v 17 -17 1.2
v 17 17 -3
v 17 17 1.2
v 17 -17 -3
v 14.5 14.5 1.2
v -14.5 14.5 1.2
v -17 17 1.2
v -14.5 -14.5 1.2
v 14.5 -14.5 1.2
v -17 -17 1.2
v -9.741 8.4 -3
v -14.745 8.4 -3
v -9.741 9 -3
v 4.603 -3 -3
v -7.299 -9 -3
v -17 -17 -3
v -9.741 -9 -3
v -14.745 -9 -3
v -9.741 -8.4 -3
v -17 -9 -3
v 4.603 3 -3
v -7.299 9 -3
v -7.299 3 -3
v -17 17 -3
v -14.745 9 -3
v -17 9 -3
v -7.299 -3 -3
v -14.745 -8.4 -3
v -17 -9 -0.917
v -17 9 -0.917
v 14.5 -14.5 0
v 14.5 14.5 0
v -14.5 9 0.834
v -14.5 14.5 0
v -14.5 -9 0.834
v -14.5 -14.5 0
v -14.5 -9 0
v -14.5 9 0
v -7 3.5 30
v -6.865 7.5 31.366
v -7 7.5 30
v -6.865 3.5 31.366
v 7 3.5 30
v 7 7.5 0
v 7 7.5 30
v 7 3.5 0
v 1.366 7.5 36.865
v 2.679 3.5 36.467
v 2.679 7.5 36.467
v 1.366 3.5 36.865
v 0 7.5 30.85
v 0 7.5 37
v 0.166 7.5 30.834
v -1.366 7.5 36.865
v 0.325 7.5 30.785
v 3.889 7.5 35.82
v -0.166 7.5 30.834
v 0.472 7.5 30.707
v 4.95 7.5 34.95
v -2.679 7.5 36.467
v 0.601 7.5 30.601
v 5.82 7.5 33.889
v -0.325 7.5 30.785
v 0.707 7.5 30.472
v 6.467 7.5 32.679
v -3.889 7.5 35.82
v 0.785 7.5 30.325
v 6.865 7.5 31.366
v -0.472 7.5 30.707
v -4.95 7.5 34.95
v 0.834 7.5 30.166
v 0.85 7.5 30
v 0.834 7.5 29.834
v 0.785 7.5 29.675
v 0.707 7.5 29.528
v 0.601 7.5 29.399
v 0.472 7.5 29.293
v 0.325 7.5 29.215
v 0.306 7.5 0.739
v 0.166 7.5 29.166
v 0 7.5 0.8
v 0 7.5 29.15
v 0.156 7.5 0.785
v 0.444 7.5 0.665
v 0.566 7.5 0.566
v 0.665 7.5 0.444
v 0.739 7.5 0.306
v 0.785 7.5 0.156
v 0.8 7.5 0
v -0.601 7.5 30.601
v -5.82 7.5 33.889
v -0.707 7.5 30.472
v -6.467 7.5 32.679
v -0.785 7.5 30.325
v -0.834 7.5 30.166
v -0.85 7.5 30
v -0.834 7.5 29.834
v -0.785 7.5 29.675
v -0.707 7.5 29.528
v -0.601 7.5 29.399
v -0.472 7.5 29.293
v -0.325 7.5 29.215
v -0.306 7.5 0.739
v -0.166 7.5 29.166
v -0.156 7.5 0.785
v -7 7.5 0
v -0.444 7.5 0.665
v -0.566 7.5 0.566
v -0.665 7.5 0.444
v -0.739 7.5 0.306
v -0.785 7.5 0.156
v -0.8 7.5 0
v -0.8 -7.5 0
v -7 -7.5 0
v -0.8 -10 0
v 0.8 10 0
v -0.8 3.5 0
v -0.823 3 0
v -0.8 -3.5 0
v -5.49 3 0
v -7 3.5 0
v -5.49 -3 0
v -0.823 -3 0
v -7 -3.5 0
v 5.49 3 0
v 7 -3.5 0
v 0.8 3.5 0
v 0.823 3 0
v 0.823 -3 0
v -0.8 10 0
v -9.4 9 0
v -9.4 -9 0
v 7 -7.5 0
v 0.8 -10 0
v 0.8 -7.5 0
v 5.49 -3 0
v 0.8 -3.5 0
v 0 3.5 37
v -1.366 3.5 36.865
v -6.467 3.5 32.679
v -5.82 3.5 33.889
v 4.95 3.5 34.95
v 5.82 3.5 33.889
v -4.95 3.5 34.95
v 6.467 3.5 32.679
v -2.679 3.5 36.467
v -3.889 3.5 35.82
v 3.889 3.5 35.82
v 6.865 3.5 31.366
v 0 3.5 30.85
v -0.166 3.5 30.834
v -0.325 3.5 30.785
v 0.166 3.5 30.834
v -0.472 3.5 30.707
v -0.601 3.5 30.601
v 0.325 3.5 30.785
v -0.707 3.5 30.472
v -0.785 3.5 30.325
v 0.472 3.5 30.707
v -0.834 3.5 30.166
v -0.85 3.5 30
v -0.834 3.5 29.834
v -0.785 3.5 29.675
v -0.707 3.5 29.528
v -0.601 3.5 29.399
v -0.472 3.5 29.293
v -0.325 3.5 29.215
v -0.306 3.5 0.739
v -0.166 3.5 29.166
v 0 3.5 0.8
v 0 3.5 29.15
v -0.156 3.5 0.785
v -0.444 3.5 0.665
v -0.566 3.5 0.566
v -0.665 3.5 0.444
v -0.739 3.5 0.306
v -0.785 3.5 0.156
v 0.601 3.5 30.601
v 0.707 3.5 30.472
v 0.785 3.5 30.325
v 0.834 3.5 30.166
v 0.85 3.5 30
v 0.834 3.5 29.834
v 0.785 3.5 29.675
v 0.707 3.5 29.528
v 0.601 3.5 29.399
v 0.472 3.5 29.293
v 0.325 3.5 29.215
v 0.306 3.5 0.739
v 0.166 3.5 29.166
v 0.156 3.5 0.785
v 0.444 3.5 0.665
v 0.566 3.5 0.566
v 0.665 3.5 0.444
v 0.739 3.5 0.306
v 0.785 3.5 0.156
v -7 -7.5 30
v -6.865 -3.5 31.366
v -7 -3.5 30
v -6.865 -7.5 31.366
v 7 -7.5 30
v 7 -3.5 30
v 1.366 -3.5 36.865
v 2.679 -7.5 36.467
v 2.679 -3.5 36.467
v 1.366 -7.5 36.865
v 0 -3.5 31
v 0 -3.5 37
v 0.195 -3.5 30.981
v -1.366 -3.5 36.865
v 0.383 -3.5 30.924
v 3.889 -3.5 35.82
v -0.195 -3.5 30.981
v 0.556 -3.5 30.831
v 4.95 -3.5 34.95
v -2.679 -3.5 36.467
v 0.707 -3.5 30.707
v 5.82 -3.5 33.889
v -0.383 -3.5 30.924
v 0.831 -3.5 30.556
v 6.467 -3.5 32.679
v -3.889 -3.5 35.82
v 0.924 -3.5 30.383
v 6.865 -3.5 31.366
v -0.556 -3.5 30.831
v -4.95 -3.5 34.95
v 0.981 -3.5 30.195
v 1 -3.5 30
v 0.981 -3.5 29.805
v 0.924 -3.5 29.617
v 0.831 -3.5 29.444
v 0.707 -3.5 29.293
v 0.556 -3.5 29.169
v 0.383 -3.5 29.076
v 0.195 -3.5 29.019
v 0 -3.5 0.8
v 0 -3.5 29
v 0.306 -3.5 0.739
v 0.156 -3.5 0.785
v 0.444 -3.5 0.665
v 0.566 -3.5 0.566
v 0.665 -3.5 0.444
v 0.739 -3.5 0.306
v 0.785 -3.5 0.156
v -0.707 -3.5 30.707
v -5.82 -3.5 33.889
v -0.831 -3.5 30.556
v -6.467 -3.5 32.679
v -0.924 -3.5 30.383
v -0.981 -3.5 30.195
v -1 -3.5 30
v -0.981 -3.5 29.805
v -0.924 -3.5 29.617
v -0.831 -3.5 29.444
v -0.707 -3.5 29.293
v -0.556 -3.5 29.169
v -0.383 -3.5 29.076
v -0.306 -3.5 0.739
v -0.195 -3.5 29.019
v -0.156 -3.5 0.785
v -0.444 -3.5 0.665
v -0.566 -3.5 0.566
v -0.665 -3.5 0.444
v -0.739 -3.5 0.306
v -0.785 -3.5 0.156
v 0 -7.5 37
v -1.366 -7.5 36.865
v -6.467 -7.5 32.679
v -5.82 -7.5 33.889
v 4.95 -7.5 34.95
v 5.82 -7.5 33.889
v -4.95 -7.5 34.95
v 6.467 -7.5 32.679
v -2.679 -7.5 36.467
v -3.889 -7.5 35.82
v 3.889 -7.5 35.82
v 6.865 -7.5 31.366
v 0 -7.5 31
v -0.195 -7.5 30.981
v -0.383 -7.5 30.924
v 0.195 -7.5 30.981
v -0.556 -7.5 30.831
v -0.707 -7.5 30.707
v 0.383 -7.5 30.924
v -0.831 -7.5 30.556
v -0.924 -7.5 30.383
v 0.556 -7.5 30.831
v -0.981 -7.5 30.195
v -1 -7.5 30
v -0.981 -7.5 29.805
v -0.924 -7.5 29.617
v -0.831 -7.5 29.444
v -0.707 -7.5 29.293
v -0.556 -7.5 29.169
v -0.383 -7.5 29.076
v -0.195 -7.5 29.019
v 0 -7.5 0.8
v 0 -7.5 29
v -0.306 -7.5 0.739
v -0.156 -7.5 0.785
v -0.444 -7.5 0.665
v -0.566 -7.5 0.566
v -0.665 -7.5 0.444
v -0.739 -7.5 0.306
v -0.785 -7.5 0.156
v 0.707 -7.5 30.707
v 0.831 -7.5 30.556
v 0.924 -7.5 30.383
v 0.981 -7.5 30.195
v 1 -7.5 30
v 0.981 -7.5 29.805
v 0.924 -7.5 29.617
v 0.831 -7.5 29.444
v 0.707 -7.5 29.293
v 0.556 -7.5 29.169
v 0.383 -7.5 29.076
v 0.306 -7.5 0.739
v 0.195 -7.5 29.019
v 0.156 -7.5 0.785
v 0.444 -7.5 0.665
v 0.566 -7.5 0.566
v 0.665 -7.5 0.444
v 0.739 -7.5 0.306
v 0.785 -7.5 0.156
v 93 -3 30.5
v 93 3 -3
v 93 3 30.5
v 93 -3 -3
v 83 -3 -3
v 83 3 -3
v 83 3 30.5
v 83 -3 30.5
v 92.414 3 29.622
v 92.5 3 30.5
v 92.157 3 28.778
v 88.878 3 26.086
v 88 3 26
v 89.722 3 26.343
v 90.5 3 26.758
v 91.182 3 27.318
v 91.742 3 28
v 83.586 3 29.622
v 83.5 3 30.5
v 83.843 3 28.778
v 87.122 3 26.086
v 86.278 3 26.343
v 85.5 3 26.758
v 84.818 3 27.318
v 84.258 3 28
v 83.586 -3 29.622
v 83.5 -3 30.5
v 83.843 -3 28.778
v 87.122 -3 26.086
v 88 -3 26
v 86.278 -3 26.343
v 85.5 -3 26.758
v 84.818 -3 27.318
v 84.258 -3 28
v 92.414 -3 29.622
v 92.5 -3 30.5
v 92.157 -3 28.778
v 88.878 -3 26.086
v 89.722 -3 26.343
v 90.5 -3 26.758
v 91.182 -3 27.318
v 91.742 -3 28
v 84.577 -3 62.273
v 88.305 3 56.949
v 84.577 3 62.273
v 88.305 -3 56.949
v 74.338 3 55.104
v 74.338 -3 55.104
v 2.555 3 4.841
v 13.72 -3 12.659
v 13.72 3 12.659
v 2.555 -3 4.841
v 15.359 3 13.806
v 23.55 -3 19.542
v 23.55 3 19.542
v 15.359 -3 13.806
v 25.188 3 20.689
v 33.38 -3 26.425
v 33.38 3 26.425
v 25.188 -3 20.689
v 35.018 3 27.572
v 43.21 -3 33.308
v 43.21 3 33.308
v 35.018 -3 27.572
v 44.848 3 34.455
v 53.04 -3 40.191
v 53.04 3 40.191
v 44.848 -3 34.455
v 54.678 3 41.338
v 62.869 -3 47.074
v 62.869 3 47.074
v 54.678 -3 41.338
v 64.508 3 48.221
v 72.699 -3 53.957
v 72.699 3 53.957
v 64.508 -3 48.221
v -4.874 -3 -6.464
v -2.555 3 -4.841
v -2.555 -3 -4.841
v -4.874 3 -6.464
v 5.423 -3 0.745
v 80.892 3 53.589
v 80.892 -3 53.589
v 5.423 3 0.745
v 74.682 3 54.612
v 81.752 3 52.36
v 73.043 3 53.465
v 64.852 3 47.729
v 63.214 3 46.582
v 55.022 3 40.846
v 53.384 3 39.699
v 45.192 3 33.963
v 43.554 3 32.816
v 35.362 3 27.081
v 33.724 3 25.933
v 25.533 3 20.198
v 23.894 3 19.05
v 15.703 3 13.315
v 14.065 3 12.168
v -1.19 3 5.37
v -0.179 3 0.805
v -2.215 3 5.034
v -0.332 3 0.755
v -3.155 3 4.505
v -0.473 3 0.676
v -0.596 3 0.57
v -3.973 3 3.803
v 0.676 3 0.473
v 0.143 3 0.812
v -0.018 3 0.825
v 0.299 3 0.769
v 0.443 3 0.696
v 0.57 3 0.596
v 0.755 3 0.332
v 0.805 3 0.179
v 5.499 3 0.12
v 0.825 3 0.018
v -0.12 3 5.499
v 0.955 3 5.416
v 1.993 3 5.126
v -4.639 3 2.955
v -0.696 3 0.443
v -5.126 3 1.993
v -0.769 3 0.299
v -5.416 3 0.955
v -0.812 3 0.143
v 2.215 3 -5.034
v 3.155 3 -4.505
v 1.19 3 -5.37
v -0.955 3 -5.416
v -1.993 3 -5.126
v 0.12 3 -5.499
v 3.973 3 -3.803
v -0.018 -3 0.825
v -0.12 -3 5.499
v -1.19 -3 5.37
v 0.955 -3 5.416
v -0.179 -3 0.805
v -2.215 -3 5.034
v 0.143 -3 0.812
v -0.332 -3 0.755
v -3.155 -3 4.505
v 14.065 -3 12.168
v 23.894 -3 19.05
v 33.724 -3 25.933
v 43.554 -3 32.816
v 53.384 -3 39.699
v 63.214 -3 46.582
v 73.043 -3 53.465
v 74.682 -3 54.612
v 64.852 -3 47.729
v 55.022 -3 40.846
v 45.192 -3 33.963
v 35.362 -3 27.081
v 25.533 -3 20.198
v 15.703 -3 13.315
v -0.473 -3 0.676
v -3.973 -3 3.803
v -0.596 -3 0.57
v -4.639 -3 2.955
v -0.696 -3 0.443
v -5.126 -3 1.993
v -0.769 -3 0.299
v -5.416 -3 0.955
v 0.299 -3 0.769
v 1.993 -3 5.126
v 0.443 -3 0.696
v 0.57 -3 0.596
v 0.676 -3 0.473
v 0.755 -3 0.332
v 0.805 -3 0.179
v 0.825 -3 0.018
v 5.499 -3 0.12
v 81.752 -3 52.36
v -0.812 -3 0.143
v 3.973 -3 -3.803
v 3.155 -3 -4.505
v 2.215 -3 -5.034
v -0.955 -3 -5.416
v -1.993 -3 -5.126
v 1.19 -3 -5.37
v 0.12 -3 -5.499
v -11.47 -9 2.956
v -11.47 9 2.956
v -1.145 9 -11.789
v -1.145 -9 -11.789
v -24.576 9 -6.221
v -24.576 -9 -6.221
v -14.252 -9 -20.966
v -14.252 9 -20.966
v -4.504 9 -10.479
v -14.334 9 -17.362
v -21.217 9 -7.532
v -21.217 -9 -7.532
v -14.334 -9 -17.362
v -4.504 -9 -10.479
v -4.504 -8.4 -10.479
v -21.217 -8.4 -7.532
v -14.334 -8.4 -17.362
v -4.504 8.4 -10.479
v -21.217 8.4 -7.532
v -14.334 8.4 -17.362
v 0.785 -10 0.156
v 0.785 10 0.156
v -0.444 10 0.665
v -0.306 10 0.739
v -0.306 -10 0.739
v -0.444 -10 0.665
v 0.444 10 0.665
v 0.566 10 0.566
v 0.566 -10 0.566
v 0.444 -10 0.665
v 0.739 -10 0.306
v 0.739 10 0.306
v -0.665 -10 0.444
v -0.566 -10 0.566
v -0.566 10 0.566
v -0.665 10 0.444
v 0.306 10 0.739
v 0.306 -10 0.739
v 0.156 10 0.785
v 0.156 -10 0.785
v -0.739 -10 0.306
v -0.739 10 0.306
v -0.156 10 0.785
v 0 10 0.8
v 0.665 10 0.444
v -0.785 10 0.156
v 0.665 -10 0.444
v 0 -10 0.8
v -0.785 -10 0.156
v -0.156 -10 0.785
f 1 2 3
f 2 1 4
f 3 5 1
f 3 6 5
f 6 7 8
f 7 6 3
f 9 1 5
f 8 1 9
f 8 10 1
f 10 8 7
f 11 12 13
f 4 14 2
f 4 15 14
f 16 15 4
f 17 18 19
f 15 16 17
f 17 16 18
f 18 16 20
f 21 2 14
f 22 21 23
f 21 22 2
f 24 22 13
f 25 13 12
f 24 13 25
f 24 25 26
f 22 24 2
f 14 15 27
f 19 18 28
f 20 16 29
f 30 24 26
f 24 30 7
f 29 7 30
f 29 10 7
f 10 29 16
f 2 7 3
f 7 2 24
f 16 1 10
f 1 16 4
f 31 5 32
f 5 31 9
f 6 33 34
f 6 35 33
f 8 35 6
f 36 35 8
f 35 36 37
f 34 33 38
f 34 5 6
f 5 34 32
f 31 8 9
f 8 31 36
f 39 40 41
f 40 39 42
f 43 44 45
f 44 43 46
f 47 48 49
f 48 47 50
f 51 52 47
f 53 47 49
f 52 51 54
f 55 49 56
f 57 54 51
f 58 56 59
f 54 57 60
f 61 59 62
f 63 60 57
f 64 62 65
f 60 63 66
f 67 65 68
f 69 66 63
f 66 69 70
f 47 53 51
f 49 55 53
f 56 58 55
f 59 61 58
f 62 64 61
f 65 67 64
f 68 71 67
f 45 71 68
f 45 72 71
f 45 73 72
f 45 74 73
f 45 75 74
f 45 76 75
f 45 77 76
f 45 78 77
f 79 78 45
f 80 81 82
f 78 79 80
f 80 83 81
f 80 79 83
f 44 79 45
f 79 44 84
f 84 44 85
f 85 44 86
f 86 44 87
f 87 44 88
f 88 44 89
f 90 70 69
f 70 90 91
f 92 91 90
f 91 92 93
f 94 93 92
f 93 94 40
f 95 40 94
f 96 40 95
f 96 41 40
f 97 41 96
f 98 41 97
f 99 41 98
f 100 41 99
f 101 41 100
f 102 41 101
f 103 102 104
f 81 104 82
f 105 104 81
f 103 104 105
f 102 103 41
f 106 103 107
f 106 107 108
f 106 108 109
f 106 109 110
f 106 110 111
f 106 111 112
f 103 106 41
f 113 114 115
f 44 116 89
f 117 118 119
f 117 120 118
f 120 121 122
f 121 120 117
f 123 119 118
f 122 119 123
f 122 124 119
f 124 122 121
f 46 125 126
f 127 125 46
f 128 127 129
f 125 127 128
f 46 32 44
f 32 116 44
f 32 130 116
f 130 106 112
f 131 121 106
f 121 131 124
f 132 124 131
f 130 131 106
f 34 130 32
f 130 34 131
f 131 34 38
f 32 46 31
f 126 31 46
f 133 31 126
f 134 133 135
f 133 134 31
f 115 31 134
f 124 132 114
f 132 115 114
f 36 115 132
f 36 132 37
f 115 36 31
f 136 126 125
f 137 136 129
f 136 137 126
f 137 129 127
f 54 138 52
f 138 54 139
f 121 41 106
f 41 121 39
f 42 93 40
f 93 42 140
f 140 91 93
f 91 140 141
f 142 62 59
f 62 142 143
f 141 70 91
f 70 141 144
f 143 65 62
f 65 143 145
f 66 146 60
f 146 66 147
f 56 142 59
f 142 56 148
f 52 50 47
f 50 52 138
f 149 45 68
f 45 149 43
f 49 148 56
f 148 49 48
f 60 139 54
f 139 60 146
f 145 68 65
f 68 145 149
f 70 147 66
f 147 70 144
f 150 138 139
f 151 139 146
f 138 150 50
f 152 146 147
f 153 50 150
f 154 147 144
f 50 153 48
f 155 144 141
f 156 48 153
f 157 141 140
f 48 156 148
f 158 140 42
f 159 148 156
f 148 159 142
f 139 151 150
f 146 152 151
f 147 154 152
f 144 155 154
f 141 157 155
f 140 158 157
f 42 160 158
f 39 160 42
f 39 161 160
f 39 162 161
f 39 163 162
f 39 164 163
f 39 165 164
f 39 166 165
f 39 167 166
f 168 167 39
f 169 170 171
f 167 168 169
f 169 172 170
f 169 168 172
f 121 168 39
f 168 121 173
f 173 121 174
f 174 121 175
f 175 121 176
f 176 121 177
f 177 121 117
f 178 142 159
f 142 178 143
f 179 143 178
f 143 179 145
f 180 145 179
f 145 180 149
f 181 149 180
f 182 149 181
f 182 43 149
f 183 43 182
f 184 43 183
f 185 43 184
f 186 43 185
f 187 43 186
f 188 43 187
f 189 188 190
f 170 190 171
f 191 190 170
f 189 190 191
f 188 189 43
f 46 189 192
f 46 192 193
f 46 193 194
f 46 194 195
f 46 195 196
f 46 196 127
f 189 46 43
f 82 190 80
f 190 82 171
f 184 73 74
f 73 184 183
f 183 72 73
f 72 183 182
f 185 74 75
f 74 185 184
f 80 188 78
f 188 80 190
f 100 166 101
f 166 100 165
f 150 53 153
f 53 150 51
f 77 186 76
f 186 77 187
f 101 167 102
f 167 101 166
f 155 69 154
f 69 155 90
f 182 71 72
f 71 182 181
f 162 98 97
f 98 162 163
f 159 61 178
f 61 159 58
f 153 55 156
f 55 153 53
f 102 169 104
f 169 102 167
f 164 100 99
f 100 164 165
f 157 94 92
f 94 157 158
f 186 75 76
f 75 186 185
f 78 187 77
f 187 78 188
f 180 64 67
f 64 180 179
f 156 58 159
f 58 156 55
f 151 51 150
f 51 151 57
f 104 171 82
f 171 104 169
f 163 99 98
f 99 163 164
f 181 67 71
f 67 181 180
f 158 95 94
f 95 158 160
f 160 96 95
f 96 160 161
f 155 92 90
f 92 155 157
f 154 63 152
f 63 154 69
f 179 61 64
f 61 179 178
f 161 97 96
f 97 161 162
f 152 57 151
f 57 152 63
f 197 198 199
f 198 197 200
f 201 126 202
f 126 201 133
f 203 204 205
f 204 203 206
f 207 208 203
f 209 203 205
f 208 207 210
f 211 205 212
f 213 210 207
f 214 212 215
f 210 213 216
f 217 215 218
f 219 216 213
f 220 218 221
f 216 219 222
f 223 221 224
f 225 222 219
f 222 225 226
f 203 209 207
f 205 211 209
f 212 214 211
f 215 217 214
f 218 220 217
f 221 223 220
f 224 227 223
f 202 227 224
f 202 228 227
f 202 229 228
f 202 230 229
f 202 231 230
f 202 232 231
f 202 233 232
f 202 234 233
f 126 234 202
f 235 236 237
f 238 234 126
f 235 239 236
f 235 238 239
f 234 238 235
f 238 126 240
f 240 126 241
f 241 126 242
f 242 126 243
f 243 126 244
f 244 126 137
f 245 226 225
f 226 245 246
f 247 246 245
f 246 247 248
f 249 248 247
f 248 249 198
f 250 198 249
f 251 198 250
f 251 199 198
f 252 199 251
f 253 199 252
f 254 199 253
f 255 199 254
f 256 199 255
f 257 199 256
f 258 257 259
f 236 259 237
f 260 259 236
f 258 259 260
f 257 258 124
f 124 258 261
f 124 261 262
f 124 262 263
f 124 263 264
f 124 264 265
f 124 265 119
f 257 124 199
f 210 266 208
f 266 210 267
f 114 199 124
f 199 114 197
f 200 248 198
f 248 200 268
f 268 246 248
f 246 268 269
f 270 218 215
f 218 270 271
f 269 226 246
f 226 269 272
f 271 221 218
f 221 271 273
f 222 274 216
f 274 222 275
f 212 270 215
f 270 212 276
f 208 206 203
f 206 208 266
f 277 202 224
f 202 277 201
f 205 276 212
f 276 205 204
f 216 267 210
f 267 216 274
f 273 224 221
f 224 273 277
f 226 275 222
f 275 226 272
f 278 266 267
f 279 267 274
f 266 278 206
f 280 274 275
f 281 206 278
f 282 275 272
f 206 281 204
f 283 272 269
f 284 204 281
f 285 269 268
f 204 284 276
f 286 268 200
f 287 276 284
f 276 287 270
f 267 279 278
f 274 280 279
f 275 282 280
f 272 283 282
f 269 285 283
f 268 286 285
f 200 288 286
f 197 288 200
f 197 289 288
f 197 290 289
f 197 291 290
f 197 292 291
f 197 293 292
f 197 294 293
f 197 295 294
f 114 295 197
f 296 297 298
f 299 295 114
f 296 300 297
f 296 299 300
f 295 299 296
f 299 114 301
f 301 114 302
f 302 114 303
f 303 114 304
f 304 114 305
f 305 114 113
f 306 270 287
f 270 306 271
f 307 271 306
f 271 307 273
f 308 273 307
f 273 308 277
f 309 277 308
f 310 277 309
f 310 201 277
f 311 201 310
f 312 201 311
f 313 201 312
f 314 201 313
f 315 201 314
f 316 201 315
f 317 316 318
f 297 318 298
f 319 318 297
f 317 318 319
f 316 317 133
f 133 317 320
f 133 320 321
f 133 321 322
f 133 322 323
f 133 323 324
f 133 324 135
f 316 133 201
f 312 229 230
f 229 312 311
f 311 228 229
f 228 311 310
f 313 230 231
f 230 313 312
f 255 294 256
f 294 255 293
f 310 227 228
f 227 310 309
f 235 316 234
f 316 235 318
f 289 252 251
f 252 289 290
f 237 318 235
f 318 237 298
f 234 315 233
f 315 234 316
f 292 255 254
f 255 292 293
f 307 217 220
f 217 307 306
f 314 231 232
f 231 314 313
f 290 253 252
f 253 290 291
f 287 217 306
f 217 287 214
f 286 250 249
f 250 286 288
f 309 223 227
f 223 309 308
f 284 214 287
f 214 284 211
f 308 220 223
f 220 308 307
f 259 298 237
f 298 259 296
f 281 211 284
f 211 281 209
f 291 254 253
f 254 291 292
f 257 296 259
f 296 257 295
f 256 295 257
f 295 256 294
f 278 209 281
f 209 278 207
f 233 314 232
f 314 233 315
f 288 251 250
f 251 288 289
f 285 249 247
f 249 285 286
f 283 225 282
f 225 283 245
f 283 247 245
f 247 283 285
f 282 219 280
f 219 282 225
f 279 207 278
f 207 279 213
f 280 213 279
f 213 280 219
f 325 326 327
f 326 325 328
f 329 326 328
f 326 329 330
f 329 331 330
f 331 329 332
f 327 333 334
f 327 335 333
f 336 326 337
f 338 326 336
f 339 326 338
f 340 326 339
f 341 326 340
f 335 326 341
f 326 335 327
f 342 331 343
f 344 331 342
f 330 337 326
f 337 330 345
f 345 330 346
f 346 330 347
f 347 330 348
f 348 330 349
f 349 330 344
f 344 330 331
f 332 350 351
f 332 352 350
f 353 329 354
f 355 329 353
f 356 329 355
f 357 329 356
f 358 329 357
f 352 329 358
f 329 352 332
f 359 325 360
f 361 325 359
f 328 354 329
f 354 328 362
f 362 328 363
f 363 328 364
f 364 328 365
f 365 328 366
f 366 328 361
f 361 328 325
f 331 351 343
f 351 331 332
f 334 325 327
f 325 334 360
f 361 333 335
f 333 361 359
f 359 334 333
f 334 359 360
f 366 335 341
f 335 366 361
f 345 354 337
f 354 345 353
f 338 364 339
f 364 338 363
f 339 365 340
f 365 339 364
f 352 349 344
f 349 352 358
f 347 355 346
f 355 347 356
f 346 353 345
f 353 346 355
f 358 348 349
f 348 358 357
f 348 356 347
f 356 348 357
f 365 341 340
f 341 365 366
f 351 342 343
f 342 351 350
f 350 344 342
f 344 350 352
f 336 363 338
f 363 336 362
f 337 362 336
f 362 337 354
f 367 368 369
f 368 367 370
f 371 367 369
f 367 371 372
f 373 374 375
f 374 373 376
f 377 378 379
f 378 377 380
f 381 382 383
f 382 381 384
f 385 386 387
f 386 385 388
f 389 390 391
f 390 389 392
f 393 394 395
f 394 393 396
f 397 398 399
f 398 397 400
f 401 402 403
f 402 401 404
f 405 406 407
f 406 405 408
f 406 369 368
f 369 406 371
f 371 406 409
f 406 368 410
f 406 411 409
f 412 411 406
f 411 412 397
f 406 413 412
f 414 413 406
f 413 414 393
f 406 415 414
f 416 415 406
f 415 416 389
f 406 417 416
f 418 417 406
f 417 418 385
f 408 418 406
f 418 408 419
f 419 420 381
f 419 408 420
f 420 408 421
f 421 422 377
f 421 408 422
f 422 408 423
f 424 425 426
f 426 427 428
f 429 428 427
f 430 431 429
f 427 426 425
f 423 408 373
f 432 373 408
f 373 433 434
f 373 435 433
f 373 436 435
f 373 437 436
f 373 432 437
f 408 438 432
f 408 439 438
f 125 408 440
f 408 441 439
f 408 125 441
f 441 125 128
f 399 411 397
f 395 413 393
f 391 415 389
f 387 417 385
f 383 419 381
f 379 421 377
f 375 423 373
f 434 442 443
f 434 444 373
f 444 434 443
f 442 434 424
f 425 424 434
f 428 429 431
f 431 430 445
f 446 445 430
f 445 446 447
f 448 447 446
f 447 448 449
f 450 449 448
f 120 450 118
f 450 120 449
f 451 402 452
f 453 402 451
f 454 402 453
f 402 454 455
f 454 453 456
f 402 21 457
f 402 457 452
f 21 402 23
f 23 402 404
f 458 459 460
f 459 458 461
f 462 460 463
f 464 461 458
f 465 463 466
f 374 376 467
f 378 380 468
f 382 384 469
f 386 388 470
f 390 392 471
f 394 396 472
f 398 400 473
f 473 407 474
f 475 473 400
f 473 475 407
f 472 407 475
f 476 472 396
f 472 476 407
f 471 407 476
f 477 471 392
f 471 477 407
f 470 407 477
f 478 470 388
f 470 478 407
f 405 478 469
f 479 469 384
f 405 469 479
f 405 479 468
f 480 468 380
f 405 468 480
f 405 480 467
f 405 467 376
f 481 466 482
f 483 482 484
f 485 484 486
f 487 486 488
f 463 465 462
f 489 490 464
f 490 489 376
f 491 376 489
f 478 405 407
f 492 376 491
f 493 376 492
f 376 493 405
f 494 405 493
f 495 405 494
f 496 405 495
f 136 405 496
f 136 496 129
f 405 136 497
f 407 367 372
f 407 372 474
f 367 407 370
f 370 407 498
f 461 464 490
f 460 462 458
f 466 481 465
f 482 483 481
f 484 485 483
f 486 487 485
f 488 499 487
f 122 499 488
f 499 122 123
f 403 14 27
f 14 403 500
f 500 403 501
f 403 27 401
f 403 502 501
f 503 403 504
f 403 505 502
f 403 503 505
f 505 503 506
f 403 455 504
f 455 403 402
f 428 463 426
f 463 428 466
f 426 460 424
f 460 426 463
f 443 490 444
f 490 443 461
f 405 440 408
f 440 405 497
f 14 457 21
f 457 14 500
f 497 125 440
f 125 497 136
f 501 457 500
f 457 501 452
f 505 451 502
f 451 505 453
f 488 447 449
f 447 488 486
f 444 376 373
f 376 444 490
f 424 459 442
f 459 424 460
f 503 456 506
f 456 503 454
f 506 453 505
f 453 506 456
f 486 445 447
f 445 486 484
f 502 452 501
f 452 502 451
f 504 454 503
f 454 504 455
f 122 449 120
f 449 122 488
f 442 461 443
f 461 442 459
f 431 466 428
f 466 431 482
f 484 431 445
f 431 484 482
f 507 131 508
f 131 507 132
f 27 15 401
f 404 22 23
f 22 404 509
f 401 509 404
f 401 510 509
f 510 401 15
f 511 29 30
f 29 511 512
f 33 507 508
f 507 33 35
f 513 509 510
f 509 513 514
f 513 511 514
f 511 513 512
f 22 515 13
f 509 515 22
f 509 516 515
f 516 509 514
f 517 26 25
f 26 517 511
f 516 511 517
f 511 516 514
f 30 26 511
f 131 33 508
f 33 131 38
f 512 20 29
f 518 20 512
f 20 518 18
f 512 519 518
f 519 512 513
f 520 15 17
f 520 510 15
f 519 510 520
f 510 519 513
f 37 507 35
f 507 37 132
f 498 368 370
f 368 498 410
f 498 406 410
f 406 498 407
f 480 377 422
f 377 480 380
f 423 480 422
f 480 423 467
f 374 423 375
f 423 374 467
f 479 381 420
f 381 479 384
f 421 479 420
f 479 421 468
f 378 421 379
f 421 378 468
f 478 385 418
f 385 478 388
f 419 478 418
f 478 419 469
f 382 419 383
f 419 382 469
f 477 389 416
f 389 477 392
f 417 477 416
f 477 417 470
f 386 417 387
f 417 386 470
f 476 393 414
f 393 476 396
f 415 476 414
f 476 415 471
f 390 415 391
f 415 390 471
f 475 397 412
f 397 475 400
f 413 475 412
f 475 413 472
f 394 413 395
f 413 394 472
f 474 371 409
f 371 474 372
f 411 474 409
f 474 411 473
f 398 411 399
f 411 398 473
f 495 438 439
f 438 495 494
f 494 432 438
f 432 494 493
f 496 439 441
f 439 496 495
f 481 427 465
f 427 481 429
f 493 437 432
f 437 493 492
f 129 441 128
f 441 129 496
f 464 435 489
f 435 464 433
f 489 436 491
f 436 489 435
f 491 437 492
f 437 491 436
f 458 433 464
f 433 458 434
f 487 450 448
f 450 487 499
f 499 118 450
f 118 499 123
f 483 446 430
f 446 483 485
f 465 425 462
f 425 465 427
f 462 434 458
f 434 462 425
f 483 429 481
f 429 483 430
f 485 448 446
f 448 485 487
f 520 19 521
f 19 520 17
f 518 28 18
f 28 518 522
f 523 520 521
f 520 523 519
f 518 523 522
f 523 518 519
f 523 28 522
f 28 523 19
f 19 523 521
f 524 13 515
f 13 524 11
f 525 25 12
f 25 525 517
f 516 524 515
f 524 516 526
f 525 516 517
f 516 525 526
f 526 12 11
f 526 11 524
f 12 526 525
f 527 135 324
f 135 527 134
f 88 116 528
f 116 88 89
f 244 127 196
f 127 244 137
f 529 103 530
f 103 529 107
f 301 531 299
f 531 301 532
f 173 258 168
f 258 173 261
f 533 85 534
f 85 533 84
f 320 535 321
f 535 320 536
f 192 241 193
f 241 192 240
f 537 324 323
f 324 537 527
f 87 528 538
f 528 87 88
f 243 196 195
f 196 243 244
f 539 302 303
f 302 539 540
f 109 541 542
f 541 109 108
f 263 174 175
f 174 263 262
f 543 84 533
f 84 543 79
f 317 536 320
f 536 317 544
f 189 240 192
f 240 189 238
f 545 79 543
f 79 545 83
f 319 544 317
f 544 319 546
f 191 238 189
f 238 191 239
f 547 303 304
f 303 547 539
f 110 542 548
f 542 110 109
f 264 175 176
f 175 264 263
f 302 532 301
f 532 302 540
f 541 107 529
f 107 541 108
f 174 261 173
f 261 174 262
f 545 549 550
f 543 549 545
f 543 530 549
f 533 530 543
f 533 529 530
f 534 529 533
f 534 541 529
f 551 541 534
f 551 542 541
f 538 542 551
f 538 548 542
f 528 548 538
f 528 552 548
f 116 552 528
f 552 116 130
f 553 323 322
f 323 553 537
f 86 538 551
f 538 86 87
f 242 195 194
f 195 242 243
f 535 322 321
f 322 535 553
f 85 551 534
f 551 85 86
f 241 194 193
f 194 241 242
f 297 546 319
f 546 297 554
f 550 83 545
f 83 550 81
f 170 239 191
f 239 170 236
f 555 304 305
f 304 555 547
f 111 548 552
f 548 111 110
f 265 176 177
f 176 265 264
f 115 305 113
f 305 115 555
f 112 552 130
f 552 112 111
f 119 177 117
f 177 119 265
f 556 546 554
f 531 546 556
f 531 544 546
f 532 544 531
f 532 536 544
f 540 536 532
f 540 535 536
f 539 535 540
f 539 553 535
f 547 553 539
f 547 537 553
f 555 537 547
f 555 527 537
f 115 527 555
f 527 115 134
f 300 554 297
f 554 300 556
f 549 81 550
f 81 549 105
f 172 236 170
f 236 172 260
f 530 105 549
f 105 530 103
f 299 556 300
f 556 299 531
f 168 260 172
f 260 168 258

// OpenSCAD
// ============================================================
// CHECKPOINT BOOM GATE - 28mm modern checkpoint terrain
// Build queue item 1. Counterweighted arm on a friction pivot.
//
// WIRE-AXLE STANDARD (1/16" brass rod, 1.6mm - load bearing):
//   boom hub      = PRESS fit (rod + 0.05)  -> rod turns WITH the arm
//   post upright A= FRICTION  (rod + 0.10)  -> the drag that holds position
//   post upright B= FREE SPIN (rod + 0.40)  -> alignment only
// Rationale: CLAUDE.md calls for one friction surface and the rest free.
// Because the boom must hold ANY angle, the rod is keyed to the arm and
// the drag is taken on a single post upright. Counterweight brings the
// arm close to balance so only light friction is needed, with a slight
// fall-closed bias (fail-safe: gate defaults shut).
//
// Parts: 1x post, 1x boom arm (with counterweight), 1x rest post,
//        2x end cap   + one 20mm length of 1.6mm brass rod
// ============================================================

/* [Show] */
// "assembly" to inspect, "layout" to export a printable STL
show = "assembly";  // [assembly, layout]
// preview angle of the raised arm (degrees) - preview only, not printed
open_angle = 35;    // [0:90]

/* [Wire Axle Standard] */
rod_d       = 1.6;              // 1/16" brass rod
press_hole  = rod_d + 0.05;     // boom hub - rod keyed to arm
friction_hole = rod_d + 0.10;   // post upright A - holds position
spin_hole   = rod_d + 0.40;     // post upright B - free
rod_len     = 20;               // brass rod the builder cuts

/* [Boom Arm] */
arm_len     = 105;              // reach forward of the pivot
arm_w       = 6;                // across the road (Y)
arm_h       = 5;                // vertical section (Z)
tail_len    = 8;                // pivot to counterweight (short: keeps the
                                // block inside the post's swing radius so it
                                // never fouls the base plate when raised)
hub_d       = 11;
stripe_pitch = 12;              // hazard stripe grooves
stripe_w    = 2.0;
stripe_deep = 0.6;

/* [Counterweight] */
cw_l        = 16;               // along the arm (X)
cw_w        = 18;               // across (Y)
cw_h        = 18;               // vertical (Z)

/* [Post] */
pivot_h     = 30;               // axle height above the base top
post_t      = 4;                // upright plate thickness
post_w      = 14;               // upright plate width (X)
fork_clear  = 0.5;              // per side, arm inside the fork
base_l      = 34;
base_w      = 34;
base_t      = 3;

/* [Rest Post] */
rest_x      = 88;               // distance from pivot to the rest cradle
rest_w      = 10;
rest_t      = 6;
cradle_d    = 9;                // U notch the arm drops into

/* [End Cap] */
cap_d       = 5;
cap_t       = 2;

$fn = 32;

fork_gap = arm_w + 2*fork_clear;          // clear space between uprights
fork_off = fork_gap/2 + post_t/2;         // upright centreline offset in Y

// ---------------- boom arm ----------------
// Pivot at the origin. Arm runs +X, counterweight tail runs -X.
// Printed lying on its side (arm_w face down) - see layout().
module boom_arm() {
    difference() {
        union() {
            // main arm
            translate([0, -arm_w/2, -arm_h/2]) cube([arm_len, arm_w, arm_h]);
            // tail to the counterweight
            translate([-tail_len, -arm_w/2, -arm_h/2]) cube([tail_len, arm_w, arm_h]);
            // pivot hub (axis along Y)
            rotate([-90, 0, 0]) cylinder(d=hub_d, h=arm_w, center=true);
            // counterweight block - concrete, sits at the tail end
            translate([-tail_len - cw_l + 0.3, -cw_w/2, -cw_h/2])
                cube([cw_l, cw_w, cw_h]);
            // arm tip - slightly deeper so it seats in the cradle
            translate([arm_len - 8, -arm_w/2, -arm_h/2 - 1.5])
                cube([8, arm_w, arm_h + 1.5]);
        }
        // press-fit axle bore - rod turns with the arm
        rotate([-90, 0, 0]) cylinder(d=press_hole, h=arm_w + 10, center=true);

        // hazard stripe grooves, cut from top and both sides
        for (i = [1 : floor((arm_len - 14) / stripe_pitch)])
            translate([hub_d/2 + 2 + i*stripe_pitch - stripe_w/2, -arm_w/2 - 1,
                       arm_h/2 - stripe_deep])
                cube([stripe_w, arm_w + 2, stripe_deep + 1]);
        // lightening pocket in the counterweight face (cast-concrete look)
        translate([-tail_len - cw_l + 2.3, -cw_w/2 - 1, -cw_h/2 + 3])
            cube([cw_l - 4, 1.6, cw_h - 6]);
        translate([-tail_len - cw_l + 2.3, cw_w/2 - 0.6, -cw_h/2 + 3])
            cube([cw_l - 4, 1.6, cw_h - 6]);
    }
}

// ---------------- post ----------------
module upright(hole) {
    difference() {
        union() {
            // plate with a rounded top around the axle
            hull() {
                translate([-post_w/2, -post_t/2, 0]) cube([post_w, post_t, 2]);
                translate([0, 0, pivot_h]) rotate([-90, 0, 0])
                    cylinder(d=post_w, h=post_t, center=true);
            }
            // gusset back to the base
            translate([-post_w/2, -post_t/2, 0]) cube([post_w, post_t, 6]);
        }
        // axle hole
        translate([0, 0, pivot_h]) rotate([-90, 0, 0])
            cylinder(d=hole, h=post_t + 10, center=true);
    }
}

module post() {
    // base plate
    translate([-base_l/2, -base_w/2, -base_t]) cube([base_l, base_w, base_t]);
    // chamfered kerb detail around the base
    difference() {
        translate([-base_l/2, -base_w/2, -base_t]) cube([base_l, base_w, base_t + 1.2]);
        translate([-base_l/2 + 2.5, -base_w/2 + 2.5, -base_t])
            cube([base_l - 5, base_w - 5, base_t + 2]);
    }
    // upright A - FRICTION side (holds the arm position)
    translate([0,  fork_off, 0]) upright(friction_hole);
    // upright B - FREE SPIN side
    translate([0, -fork_off, 0]) upright(spin_hole);
}

// ---------------- rest post (arm drops onto this) ----------------
module rest_post() {
    // cradle floor must land exactly on the underside of the arm tip so the
    // gate physically rests closed: floor = pivot_h - arm_h/2 - tip_drop
    rest_h = pivot_h - arm_h/2 - 1.5 + cradle_d/2;
    difference() {
        union() {
            translate([-rest_w/2, -rest_t/2, -base_t])
                cube([rest_w, rest_t, base_t]);
            translate([-rest_w/2, -rest_t/2, 0]) cube([rest_w, rest_t, rest_h]);
        }
        // U-shaped cradle notch
        translate([0, 0, rest_h]) rotate([-90, 0, 0])
            cylinder(d=cradle_d, h=rest_t + 2, center=true);
        translate([-cradle_d/2, -rest_t/2 - 1, rest_h])
            cube([cradle_d, rest_t + 2, cradle_d]);
    }
}

// ---------------- end cap (press-fit rod retainer) ----------------
module end_cap() {
    difference() {
        cylinder(d=cap_d, h=cap_t);
        translate([0, 0, -0.5]) cylinder(d=press_hole, h=cap_t + 1);
    }
}

// ---------------- assembled preview ----------------
module assembly(angle = 0) {
    post();
    translate([rest_x, 0, 0]) rest_post();
    translate([0, 0, 0]) rotate([0, -angle, 0]) boom_arm();
    // brass rod - reference only, never exported
    color("gold") rotate([-90, 0, 0])
        cylinder(d=rod_d, h=rod_len, center=true);
}

// ---------------- print layout ----------------
module layout() {
    // Arm on its side. After rotate([90,0,0]) the part's Y extent becomes Z,
    // so it must be lifted by the LARGEST half-Y in the part - that is the
    // counterweight (cw_w), not the arm (arm_w). Lifting by arm_w/2 buries
    // the counterweight 6mm under the bed.
    translate([0, 0, cw_w/2]) rotate([90, 0, 0]) boom_arm();
    // post and rest post both carry their base below z=0 - lift onto the bed
    translate([0,  50, base_t]) post();
    translate([55, 50, base_t]) rest_post();
    translate([75, 50, 0]) end_cap();
    translate([85, 50, 0]) end_cap();
}

// set false when this file is `include`d by a diagnostic/test script
render_top = true;

if (render_top) {
    if (show == "assembly") assembly(open_angle);
    else layout();
}
